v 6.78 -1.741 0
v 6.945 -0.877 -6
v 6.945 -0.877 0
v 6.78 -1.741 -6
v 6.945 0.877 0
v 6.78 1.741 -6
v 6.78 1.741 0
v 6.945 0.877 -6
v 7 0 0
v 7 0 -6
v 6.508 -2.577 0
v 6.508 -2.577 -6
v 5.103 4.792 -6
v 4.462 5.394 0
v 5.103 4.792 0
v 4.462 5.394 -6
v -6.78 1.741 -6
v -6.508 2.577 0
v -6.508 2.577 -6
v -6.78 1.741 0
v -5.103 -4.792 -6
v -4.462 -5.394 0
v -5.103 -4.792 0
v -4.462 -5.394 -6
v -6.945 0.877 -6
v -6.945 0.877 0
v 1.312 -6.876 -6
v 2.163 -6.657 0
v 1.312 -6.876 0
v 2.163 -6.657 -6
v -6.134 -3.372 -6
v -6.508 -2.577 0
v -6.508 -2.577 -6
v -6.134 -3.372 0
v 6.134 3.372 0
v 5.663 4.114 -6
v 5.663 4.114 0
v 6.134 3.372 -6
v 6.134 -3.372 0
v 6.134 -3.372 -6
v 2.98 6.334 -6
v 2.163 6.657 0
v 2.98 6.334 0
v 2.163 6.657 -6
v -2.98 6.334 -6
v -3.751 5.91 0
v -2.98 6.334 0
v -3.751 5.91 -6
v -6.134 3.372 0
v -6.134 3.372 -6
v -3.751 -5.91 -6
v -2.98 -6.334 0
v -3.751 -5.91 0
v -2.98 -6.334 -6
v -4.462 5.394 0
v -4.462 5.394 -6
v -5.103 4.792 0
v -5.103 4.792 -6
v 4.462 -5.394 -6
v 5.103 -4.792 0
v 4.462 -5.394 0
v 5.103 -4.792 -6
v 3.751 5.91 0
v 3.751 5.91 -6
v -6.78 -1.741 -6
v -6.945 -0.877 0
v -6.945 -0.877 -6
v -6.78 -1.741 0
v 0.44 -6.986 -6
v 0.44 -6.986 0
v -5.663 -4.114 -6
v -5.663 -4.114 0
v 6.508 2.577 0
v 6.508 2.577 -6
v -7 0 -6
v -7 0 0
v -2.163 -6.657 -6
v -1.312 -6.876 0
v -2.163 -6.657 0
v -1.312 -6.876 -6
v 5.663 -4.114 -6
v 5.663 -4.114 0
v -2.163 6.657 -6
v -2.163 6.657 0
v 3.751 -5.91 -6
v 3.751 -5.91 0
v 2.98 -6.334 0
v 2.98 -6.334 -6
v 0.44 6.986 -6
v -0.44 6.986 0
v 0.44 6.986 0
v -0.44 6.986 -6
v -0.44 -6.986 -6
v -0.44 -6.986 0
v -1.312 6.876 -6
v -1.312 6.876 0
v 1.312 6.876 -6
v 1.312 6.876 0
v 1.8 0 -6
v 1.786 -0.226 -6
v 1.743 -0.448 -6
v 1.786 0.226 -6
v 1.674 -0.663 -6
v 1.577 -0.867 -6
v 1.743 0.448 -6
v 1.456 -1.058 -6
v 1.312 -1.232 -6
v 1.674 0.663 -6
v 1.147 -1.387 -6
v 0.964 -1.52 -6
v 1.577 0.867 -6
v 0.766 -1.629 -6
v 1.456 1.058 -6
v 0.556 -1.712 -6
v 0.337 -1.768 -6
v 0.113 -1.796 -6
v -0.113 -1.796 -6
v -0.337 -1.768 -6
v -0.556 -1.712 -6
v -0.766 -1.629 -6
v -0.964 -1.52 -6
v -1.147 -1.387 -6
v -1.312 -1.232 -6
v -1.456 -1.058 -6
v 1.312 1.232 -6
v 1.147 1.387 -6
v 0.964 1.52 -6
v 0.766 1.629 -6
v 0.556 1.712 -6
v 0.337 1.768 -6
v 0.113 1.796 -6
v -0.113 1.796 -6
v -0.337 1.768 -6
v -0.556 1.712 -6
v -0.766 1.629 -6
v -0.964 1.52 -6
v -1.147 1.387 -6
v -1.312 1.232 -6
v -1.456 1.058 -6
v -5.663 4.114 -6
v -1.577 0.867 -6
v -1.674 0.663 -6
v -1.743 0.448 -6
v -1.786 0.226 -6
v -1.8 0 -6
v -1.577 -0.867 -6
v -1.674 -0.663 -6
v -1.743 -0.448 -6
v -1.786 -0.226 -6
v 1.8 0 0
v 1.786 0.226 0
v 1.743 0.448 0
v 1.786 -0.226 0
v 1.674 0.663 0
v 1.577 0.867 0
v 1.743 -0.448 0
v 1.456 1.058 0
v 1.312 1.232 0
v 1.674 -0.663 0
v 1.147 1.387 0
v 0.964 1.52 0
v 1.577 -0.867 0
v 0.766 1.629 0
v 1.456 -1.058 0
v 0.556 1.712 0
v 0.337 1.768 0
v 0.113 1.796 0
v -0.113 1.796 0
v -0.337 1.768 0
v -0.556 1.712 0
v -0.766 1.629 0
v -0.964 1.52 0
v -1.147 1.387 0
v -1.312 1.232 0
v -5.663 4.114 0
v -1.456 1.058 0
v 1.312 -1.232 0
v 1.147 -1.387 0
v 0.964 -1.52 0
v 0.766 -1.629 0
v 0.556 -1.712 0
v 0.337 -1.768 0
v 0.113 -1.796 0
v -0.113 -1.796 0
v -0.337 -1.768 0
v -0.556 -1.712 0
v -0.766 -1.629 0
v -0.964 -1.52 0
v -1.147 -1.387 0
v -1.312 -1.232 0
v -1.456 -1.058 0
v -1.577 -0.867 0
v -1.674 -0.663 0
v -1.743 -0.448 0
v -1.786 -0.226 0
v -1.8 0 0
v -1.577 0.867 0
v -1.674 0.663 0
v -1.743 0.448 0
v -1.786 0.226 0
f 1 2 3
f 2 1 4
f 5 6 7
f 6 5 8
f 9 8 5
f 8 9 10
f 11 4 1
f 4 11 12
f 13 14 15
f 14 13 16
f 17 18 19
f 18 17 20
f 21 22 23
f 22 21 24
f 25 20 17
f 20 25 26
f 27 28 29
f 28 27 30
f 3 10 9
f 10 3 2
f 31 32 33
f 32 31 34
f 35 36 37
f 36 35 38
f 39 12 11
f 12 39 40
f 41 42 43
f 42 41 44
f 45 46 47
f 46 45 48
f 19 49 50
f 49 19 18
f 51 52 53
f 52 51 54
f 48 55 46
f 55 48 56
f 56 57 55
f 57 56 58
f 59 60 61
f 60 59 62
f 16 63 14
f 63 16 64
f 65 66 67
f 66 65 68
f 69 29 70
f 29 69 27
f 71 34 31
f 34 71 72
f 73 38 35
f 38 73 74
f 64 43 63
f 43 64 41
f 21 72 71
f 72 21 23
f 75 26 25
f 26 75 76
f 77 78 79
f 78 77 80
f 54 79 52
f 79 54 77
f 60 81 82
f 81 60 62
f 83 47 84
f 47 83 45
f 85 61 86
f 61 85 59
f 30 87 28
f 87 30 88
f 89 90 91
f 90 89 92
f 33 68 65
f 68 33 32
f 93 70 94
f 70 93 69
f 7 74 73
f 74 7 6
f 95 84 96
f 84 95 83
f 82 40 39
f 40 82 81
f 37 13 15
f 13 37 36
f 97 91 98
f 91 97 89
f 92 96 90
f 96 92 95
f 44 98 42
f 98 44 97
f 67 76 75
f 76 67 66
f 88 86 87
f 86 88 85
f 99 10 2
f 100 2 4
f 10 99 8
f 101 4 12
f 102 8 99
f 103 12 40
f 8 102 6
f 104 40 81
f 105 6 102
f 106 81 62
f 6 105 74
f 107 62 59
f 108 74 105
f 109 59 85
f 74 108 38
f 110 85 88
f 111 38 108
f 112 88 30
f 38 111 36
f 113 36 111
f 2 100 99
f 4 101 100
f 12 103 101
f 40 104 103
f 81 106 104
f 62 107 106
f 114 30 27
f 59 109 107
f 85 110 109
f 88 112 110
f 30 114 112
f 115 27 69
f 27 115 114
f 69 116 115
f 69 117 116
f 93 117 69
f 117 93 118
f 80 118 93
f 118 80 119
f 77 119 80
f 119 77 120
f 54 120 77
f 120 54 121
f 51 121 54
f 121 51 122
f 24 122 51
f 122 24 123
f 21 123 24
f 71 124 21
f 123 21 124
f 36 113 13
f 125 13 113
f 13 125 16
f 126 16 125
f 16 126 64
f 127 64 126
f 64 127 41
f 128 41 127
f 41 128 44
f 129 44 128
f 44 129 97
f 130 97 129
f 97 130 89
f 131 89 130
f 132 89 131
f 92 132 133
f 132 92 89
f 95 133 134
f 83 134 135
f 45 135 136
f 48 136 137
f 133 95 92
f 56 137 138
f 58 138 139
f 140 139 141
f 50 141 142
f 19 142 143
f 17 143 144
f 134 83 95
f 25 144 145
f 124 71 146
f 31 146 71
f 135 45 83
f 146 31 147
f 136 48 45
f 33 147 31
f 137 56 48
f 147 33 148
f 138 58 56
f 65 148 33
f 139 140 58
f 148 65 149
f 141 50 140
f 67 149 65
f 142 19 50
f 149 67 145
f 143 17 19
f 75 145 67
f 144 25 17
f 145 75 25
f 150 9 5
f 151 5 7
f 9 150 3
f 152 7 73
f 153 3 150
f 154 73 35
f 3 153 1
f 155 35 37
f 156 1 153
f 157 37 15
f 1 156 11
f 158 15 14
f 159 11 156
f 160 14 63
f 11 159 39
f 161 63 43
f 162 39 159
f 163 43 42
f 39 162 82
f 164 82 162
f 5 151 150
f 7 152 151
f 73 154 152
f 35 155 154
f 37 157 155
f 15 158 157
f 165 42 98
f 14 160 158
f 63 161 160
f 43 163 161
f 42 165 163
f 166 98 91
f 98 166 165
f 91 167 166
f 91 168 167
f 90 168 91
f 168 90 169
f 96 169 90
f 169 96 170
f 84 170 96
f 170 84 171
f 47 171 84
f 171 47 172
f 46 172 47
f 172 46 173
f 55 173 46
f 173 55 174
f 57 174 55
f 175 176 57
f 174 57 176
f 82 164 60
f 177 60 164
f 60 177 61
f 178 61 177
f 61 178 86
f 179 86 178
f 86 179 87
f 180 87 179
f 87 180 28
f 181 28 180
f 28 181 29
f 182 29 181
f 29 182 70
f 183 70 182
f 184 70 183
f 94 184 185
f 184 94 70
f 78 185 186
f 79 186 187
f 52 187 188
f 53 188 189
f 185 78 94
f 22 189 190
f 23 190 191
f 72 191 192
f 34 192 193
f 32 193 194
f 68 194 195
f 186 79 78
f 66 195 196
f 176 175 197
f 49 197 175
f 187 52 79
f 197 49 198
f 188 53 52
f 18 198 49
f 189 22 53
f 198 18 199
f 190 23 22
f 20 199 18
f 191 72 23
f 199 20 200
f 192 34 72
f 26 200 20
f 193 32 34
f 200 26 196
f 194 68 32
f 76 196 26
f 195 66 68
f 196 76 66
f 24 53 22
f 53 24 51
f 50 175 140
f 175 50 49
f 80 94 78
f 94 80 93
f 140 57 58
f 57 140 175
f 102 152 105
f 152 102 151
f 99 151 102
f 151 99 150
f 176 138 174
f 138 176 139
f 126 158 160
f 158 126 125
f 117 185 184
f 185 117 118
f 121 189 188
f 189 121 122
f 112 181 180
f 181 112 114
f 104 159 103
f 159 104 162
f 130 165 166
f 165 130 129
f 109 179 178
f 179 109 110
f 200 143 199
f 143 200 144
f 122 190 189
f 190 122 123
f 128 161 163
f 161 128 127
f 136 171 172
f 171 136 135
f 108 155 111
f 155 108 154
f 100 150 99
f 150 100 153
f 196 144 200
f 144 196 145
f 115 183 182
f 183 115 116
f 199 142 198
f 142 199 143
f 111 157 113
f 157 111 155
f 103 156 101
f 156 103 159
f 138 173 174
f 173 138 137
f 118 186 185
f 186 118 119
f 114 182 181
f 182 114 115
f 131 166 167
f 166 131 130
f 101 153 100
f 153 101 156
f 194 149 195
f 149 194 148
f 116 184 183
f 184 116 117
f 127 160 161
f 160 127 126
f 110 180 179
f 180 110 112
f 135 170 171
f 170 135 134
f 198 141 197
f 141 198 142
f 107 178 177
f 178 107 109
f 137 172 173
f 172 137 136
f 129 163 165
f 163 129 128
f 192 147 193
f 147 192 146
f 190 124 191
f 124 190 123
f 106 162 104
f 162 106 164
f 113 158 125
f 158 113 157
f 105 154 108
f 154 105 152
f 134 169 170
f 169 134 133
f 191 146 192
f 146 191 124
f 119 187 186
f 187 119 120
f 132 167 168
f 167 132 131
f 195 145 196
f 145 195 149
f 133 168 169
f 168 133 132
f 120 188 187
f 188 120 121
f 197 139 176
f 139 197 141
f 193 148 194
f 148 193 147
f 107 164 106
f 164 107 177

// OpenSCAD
$fn = 50;


difference() {
	union() {
		translate(v = [0, 0, -6.0000000000]) {
			cylinder(h = 6, r = 7.0000000000);
		}
		cylinder(h = 0, r = 13.0000000000);
	}
	union() {
		#translate(v = [0, 0, -6]) {
			cylinder(h = 6, r = 1.8000000000);
		}
	}
}
